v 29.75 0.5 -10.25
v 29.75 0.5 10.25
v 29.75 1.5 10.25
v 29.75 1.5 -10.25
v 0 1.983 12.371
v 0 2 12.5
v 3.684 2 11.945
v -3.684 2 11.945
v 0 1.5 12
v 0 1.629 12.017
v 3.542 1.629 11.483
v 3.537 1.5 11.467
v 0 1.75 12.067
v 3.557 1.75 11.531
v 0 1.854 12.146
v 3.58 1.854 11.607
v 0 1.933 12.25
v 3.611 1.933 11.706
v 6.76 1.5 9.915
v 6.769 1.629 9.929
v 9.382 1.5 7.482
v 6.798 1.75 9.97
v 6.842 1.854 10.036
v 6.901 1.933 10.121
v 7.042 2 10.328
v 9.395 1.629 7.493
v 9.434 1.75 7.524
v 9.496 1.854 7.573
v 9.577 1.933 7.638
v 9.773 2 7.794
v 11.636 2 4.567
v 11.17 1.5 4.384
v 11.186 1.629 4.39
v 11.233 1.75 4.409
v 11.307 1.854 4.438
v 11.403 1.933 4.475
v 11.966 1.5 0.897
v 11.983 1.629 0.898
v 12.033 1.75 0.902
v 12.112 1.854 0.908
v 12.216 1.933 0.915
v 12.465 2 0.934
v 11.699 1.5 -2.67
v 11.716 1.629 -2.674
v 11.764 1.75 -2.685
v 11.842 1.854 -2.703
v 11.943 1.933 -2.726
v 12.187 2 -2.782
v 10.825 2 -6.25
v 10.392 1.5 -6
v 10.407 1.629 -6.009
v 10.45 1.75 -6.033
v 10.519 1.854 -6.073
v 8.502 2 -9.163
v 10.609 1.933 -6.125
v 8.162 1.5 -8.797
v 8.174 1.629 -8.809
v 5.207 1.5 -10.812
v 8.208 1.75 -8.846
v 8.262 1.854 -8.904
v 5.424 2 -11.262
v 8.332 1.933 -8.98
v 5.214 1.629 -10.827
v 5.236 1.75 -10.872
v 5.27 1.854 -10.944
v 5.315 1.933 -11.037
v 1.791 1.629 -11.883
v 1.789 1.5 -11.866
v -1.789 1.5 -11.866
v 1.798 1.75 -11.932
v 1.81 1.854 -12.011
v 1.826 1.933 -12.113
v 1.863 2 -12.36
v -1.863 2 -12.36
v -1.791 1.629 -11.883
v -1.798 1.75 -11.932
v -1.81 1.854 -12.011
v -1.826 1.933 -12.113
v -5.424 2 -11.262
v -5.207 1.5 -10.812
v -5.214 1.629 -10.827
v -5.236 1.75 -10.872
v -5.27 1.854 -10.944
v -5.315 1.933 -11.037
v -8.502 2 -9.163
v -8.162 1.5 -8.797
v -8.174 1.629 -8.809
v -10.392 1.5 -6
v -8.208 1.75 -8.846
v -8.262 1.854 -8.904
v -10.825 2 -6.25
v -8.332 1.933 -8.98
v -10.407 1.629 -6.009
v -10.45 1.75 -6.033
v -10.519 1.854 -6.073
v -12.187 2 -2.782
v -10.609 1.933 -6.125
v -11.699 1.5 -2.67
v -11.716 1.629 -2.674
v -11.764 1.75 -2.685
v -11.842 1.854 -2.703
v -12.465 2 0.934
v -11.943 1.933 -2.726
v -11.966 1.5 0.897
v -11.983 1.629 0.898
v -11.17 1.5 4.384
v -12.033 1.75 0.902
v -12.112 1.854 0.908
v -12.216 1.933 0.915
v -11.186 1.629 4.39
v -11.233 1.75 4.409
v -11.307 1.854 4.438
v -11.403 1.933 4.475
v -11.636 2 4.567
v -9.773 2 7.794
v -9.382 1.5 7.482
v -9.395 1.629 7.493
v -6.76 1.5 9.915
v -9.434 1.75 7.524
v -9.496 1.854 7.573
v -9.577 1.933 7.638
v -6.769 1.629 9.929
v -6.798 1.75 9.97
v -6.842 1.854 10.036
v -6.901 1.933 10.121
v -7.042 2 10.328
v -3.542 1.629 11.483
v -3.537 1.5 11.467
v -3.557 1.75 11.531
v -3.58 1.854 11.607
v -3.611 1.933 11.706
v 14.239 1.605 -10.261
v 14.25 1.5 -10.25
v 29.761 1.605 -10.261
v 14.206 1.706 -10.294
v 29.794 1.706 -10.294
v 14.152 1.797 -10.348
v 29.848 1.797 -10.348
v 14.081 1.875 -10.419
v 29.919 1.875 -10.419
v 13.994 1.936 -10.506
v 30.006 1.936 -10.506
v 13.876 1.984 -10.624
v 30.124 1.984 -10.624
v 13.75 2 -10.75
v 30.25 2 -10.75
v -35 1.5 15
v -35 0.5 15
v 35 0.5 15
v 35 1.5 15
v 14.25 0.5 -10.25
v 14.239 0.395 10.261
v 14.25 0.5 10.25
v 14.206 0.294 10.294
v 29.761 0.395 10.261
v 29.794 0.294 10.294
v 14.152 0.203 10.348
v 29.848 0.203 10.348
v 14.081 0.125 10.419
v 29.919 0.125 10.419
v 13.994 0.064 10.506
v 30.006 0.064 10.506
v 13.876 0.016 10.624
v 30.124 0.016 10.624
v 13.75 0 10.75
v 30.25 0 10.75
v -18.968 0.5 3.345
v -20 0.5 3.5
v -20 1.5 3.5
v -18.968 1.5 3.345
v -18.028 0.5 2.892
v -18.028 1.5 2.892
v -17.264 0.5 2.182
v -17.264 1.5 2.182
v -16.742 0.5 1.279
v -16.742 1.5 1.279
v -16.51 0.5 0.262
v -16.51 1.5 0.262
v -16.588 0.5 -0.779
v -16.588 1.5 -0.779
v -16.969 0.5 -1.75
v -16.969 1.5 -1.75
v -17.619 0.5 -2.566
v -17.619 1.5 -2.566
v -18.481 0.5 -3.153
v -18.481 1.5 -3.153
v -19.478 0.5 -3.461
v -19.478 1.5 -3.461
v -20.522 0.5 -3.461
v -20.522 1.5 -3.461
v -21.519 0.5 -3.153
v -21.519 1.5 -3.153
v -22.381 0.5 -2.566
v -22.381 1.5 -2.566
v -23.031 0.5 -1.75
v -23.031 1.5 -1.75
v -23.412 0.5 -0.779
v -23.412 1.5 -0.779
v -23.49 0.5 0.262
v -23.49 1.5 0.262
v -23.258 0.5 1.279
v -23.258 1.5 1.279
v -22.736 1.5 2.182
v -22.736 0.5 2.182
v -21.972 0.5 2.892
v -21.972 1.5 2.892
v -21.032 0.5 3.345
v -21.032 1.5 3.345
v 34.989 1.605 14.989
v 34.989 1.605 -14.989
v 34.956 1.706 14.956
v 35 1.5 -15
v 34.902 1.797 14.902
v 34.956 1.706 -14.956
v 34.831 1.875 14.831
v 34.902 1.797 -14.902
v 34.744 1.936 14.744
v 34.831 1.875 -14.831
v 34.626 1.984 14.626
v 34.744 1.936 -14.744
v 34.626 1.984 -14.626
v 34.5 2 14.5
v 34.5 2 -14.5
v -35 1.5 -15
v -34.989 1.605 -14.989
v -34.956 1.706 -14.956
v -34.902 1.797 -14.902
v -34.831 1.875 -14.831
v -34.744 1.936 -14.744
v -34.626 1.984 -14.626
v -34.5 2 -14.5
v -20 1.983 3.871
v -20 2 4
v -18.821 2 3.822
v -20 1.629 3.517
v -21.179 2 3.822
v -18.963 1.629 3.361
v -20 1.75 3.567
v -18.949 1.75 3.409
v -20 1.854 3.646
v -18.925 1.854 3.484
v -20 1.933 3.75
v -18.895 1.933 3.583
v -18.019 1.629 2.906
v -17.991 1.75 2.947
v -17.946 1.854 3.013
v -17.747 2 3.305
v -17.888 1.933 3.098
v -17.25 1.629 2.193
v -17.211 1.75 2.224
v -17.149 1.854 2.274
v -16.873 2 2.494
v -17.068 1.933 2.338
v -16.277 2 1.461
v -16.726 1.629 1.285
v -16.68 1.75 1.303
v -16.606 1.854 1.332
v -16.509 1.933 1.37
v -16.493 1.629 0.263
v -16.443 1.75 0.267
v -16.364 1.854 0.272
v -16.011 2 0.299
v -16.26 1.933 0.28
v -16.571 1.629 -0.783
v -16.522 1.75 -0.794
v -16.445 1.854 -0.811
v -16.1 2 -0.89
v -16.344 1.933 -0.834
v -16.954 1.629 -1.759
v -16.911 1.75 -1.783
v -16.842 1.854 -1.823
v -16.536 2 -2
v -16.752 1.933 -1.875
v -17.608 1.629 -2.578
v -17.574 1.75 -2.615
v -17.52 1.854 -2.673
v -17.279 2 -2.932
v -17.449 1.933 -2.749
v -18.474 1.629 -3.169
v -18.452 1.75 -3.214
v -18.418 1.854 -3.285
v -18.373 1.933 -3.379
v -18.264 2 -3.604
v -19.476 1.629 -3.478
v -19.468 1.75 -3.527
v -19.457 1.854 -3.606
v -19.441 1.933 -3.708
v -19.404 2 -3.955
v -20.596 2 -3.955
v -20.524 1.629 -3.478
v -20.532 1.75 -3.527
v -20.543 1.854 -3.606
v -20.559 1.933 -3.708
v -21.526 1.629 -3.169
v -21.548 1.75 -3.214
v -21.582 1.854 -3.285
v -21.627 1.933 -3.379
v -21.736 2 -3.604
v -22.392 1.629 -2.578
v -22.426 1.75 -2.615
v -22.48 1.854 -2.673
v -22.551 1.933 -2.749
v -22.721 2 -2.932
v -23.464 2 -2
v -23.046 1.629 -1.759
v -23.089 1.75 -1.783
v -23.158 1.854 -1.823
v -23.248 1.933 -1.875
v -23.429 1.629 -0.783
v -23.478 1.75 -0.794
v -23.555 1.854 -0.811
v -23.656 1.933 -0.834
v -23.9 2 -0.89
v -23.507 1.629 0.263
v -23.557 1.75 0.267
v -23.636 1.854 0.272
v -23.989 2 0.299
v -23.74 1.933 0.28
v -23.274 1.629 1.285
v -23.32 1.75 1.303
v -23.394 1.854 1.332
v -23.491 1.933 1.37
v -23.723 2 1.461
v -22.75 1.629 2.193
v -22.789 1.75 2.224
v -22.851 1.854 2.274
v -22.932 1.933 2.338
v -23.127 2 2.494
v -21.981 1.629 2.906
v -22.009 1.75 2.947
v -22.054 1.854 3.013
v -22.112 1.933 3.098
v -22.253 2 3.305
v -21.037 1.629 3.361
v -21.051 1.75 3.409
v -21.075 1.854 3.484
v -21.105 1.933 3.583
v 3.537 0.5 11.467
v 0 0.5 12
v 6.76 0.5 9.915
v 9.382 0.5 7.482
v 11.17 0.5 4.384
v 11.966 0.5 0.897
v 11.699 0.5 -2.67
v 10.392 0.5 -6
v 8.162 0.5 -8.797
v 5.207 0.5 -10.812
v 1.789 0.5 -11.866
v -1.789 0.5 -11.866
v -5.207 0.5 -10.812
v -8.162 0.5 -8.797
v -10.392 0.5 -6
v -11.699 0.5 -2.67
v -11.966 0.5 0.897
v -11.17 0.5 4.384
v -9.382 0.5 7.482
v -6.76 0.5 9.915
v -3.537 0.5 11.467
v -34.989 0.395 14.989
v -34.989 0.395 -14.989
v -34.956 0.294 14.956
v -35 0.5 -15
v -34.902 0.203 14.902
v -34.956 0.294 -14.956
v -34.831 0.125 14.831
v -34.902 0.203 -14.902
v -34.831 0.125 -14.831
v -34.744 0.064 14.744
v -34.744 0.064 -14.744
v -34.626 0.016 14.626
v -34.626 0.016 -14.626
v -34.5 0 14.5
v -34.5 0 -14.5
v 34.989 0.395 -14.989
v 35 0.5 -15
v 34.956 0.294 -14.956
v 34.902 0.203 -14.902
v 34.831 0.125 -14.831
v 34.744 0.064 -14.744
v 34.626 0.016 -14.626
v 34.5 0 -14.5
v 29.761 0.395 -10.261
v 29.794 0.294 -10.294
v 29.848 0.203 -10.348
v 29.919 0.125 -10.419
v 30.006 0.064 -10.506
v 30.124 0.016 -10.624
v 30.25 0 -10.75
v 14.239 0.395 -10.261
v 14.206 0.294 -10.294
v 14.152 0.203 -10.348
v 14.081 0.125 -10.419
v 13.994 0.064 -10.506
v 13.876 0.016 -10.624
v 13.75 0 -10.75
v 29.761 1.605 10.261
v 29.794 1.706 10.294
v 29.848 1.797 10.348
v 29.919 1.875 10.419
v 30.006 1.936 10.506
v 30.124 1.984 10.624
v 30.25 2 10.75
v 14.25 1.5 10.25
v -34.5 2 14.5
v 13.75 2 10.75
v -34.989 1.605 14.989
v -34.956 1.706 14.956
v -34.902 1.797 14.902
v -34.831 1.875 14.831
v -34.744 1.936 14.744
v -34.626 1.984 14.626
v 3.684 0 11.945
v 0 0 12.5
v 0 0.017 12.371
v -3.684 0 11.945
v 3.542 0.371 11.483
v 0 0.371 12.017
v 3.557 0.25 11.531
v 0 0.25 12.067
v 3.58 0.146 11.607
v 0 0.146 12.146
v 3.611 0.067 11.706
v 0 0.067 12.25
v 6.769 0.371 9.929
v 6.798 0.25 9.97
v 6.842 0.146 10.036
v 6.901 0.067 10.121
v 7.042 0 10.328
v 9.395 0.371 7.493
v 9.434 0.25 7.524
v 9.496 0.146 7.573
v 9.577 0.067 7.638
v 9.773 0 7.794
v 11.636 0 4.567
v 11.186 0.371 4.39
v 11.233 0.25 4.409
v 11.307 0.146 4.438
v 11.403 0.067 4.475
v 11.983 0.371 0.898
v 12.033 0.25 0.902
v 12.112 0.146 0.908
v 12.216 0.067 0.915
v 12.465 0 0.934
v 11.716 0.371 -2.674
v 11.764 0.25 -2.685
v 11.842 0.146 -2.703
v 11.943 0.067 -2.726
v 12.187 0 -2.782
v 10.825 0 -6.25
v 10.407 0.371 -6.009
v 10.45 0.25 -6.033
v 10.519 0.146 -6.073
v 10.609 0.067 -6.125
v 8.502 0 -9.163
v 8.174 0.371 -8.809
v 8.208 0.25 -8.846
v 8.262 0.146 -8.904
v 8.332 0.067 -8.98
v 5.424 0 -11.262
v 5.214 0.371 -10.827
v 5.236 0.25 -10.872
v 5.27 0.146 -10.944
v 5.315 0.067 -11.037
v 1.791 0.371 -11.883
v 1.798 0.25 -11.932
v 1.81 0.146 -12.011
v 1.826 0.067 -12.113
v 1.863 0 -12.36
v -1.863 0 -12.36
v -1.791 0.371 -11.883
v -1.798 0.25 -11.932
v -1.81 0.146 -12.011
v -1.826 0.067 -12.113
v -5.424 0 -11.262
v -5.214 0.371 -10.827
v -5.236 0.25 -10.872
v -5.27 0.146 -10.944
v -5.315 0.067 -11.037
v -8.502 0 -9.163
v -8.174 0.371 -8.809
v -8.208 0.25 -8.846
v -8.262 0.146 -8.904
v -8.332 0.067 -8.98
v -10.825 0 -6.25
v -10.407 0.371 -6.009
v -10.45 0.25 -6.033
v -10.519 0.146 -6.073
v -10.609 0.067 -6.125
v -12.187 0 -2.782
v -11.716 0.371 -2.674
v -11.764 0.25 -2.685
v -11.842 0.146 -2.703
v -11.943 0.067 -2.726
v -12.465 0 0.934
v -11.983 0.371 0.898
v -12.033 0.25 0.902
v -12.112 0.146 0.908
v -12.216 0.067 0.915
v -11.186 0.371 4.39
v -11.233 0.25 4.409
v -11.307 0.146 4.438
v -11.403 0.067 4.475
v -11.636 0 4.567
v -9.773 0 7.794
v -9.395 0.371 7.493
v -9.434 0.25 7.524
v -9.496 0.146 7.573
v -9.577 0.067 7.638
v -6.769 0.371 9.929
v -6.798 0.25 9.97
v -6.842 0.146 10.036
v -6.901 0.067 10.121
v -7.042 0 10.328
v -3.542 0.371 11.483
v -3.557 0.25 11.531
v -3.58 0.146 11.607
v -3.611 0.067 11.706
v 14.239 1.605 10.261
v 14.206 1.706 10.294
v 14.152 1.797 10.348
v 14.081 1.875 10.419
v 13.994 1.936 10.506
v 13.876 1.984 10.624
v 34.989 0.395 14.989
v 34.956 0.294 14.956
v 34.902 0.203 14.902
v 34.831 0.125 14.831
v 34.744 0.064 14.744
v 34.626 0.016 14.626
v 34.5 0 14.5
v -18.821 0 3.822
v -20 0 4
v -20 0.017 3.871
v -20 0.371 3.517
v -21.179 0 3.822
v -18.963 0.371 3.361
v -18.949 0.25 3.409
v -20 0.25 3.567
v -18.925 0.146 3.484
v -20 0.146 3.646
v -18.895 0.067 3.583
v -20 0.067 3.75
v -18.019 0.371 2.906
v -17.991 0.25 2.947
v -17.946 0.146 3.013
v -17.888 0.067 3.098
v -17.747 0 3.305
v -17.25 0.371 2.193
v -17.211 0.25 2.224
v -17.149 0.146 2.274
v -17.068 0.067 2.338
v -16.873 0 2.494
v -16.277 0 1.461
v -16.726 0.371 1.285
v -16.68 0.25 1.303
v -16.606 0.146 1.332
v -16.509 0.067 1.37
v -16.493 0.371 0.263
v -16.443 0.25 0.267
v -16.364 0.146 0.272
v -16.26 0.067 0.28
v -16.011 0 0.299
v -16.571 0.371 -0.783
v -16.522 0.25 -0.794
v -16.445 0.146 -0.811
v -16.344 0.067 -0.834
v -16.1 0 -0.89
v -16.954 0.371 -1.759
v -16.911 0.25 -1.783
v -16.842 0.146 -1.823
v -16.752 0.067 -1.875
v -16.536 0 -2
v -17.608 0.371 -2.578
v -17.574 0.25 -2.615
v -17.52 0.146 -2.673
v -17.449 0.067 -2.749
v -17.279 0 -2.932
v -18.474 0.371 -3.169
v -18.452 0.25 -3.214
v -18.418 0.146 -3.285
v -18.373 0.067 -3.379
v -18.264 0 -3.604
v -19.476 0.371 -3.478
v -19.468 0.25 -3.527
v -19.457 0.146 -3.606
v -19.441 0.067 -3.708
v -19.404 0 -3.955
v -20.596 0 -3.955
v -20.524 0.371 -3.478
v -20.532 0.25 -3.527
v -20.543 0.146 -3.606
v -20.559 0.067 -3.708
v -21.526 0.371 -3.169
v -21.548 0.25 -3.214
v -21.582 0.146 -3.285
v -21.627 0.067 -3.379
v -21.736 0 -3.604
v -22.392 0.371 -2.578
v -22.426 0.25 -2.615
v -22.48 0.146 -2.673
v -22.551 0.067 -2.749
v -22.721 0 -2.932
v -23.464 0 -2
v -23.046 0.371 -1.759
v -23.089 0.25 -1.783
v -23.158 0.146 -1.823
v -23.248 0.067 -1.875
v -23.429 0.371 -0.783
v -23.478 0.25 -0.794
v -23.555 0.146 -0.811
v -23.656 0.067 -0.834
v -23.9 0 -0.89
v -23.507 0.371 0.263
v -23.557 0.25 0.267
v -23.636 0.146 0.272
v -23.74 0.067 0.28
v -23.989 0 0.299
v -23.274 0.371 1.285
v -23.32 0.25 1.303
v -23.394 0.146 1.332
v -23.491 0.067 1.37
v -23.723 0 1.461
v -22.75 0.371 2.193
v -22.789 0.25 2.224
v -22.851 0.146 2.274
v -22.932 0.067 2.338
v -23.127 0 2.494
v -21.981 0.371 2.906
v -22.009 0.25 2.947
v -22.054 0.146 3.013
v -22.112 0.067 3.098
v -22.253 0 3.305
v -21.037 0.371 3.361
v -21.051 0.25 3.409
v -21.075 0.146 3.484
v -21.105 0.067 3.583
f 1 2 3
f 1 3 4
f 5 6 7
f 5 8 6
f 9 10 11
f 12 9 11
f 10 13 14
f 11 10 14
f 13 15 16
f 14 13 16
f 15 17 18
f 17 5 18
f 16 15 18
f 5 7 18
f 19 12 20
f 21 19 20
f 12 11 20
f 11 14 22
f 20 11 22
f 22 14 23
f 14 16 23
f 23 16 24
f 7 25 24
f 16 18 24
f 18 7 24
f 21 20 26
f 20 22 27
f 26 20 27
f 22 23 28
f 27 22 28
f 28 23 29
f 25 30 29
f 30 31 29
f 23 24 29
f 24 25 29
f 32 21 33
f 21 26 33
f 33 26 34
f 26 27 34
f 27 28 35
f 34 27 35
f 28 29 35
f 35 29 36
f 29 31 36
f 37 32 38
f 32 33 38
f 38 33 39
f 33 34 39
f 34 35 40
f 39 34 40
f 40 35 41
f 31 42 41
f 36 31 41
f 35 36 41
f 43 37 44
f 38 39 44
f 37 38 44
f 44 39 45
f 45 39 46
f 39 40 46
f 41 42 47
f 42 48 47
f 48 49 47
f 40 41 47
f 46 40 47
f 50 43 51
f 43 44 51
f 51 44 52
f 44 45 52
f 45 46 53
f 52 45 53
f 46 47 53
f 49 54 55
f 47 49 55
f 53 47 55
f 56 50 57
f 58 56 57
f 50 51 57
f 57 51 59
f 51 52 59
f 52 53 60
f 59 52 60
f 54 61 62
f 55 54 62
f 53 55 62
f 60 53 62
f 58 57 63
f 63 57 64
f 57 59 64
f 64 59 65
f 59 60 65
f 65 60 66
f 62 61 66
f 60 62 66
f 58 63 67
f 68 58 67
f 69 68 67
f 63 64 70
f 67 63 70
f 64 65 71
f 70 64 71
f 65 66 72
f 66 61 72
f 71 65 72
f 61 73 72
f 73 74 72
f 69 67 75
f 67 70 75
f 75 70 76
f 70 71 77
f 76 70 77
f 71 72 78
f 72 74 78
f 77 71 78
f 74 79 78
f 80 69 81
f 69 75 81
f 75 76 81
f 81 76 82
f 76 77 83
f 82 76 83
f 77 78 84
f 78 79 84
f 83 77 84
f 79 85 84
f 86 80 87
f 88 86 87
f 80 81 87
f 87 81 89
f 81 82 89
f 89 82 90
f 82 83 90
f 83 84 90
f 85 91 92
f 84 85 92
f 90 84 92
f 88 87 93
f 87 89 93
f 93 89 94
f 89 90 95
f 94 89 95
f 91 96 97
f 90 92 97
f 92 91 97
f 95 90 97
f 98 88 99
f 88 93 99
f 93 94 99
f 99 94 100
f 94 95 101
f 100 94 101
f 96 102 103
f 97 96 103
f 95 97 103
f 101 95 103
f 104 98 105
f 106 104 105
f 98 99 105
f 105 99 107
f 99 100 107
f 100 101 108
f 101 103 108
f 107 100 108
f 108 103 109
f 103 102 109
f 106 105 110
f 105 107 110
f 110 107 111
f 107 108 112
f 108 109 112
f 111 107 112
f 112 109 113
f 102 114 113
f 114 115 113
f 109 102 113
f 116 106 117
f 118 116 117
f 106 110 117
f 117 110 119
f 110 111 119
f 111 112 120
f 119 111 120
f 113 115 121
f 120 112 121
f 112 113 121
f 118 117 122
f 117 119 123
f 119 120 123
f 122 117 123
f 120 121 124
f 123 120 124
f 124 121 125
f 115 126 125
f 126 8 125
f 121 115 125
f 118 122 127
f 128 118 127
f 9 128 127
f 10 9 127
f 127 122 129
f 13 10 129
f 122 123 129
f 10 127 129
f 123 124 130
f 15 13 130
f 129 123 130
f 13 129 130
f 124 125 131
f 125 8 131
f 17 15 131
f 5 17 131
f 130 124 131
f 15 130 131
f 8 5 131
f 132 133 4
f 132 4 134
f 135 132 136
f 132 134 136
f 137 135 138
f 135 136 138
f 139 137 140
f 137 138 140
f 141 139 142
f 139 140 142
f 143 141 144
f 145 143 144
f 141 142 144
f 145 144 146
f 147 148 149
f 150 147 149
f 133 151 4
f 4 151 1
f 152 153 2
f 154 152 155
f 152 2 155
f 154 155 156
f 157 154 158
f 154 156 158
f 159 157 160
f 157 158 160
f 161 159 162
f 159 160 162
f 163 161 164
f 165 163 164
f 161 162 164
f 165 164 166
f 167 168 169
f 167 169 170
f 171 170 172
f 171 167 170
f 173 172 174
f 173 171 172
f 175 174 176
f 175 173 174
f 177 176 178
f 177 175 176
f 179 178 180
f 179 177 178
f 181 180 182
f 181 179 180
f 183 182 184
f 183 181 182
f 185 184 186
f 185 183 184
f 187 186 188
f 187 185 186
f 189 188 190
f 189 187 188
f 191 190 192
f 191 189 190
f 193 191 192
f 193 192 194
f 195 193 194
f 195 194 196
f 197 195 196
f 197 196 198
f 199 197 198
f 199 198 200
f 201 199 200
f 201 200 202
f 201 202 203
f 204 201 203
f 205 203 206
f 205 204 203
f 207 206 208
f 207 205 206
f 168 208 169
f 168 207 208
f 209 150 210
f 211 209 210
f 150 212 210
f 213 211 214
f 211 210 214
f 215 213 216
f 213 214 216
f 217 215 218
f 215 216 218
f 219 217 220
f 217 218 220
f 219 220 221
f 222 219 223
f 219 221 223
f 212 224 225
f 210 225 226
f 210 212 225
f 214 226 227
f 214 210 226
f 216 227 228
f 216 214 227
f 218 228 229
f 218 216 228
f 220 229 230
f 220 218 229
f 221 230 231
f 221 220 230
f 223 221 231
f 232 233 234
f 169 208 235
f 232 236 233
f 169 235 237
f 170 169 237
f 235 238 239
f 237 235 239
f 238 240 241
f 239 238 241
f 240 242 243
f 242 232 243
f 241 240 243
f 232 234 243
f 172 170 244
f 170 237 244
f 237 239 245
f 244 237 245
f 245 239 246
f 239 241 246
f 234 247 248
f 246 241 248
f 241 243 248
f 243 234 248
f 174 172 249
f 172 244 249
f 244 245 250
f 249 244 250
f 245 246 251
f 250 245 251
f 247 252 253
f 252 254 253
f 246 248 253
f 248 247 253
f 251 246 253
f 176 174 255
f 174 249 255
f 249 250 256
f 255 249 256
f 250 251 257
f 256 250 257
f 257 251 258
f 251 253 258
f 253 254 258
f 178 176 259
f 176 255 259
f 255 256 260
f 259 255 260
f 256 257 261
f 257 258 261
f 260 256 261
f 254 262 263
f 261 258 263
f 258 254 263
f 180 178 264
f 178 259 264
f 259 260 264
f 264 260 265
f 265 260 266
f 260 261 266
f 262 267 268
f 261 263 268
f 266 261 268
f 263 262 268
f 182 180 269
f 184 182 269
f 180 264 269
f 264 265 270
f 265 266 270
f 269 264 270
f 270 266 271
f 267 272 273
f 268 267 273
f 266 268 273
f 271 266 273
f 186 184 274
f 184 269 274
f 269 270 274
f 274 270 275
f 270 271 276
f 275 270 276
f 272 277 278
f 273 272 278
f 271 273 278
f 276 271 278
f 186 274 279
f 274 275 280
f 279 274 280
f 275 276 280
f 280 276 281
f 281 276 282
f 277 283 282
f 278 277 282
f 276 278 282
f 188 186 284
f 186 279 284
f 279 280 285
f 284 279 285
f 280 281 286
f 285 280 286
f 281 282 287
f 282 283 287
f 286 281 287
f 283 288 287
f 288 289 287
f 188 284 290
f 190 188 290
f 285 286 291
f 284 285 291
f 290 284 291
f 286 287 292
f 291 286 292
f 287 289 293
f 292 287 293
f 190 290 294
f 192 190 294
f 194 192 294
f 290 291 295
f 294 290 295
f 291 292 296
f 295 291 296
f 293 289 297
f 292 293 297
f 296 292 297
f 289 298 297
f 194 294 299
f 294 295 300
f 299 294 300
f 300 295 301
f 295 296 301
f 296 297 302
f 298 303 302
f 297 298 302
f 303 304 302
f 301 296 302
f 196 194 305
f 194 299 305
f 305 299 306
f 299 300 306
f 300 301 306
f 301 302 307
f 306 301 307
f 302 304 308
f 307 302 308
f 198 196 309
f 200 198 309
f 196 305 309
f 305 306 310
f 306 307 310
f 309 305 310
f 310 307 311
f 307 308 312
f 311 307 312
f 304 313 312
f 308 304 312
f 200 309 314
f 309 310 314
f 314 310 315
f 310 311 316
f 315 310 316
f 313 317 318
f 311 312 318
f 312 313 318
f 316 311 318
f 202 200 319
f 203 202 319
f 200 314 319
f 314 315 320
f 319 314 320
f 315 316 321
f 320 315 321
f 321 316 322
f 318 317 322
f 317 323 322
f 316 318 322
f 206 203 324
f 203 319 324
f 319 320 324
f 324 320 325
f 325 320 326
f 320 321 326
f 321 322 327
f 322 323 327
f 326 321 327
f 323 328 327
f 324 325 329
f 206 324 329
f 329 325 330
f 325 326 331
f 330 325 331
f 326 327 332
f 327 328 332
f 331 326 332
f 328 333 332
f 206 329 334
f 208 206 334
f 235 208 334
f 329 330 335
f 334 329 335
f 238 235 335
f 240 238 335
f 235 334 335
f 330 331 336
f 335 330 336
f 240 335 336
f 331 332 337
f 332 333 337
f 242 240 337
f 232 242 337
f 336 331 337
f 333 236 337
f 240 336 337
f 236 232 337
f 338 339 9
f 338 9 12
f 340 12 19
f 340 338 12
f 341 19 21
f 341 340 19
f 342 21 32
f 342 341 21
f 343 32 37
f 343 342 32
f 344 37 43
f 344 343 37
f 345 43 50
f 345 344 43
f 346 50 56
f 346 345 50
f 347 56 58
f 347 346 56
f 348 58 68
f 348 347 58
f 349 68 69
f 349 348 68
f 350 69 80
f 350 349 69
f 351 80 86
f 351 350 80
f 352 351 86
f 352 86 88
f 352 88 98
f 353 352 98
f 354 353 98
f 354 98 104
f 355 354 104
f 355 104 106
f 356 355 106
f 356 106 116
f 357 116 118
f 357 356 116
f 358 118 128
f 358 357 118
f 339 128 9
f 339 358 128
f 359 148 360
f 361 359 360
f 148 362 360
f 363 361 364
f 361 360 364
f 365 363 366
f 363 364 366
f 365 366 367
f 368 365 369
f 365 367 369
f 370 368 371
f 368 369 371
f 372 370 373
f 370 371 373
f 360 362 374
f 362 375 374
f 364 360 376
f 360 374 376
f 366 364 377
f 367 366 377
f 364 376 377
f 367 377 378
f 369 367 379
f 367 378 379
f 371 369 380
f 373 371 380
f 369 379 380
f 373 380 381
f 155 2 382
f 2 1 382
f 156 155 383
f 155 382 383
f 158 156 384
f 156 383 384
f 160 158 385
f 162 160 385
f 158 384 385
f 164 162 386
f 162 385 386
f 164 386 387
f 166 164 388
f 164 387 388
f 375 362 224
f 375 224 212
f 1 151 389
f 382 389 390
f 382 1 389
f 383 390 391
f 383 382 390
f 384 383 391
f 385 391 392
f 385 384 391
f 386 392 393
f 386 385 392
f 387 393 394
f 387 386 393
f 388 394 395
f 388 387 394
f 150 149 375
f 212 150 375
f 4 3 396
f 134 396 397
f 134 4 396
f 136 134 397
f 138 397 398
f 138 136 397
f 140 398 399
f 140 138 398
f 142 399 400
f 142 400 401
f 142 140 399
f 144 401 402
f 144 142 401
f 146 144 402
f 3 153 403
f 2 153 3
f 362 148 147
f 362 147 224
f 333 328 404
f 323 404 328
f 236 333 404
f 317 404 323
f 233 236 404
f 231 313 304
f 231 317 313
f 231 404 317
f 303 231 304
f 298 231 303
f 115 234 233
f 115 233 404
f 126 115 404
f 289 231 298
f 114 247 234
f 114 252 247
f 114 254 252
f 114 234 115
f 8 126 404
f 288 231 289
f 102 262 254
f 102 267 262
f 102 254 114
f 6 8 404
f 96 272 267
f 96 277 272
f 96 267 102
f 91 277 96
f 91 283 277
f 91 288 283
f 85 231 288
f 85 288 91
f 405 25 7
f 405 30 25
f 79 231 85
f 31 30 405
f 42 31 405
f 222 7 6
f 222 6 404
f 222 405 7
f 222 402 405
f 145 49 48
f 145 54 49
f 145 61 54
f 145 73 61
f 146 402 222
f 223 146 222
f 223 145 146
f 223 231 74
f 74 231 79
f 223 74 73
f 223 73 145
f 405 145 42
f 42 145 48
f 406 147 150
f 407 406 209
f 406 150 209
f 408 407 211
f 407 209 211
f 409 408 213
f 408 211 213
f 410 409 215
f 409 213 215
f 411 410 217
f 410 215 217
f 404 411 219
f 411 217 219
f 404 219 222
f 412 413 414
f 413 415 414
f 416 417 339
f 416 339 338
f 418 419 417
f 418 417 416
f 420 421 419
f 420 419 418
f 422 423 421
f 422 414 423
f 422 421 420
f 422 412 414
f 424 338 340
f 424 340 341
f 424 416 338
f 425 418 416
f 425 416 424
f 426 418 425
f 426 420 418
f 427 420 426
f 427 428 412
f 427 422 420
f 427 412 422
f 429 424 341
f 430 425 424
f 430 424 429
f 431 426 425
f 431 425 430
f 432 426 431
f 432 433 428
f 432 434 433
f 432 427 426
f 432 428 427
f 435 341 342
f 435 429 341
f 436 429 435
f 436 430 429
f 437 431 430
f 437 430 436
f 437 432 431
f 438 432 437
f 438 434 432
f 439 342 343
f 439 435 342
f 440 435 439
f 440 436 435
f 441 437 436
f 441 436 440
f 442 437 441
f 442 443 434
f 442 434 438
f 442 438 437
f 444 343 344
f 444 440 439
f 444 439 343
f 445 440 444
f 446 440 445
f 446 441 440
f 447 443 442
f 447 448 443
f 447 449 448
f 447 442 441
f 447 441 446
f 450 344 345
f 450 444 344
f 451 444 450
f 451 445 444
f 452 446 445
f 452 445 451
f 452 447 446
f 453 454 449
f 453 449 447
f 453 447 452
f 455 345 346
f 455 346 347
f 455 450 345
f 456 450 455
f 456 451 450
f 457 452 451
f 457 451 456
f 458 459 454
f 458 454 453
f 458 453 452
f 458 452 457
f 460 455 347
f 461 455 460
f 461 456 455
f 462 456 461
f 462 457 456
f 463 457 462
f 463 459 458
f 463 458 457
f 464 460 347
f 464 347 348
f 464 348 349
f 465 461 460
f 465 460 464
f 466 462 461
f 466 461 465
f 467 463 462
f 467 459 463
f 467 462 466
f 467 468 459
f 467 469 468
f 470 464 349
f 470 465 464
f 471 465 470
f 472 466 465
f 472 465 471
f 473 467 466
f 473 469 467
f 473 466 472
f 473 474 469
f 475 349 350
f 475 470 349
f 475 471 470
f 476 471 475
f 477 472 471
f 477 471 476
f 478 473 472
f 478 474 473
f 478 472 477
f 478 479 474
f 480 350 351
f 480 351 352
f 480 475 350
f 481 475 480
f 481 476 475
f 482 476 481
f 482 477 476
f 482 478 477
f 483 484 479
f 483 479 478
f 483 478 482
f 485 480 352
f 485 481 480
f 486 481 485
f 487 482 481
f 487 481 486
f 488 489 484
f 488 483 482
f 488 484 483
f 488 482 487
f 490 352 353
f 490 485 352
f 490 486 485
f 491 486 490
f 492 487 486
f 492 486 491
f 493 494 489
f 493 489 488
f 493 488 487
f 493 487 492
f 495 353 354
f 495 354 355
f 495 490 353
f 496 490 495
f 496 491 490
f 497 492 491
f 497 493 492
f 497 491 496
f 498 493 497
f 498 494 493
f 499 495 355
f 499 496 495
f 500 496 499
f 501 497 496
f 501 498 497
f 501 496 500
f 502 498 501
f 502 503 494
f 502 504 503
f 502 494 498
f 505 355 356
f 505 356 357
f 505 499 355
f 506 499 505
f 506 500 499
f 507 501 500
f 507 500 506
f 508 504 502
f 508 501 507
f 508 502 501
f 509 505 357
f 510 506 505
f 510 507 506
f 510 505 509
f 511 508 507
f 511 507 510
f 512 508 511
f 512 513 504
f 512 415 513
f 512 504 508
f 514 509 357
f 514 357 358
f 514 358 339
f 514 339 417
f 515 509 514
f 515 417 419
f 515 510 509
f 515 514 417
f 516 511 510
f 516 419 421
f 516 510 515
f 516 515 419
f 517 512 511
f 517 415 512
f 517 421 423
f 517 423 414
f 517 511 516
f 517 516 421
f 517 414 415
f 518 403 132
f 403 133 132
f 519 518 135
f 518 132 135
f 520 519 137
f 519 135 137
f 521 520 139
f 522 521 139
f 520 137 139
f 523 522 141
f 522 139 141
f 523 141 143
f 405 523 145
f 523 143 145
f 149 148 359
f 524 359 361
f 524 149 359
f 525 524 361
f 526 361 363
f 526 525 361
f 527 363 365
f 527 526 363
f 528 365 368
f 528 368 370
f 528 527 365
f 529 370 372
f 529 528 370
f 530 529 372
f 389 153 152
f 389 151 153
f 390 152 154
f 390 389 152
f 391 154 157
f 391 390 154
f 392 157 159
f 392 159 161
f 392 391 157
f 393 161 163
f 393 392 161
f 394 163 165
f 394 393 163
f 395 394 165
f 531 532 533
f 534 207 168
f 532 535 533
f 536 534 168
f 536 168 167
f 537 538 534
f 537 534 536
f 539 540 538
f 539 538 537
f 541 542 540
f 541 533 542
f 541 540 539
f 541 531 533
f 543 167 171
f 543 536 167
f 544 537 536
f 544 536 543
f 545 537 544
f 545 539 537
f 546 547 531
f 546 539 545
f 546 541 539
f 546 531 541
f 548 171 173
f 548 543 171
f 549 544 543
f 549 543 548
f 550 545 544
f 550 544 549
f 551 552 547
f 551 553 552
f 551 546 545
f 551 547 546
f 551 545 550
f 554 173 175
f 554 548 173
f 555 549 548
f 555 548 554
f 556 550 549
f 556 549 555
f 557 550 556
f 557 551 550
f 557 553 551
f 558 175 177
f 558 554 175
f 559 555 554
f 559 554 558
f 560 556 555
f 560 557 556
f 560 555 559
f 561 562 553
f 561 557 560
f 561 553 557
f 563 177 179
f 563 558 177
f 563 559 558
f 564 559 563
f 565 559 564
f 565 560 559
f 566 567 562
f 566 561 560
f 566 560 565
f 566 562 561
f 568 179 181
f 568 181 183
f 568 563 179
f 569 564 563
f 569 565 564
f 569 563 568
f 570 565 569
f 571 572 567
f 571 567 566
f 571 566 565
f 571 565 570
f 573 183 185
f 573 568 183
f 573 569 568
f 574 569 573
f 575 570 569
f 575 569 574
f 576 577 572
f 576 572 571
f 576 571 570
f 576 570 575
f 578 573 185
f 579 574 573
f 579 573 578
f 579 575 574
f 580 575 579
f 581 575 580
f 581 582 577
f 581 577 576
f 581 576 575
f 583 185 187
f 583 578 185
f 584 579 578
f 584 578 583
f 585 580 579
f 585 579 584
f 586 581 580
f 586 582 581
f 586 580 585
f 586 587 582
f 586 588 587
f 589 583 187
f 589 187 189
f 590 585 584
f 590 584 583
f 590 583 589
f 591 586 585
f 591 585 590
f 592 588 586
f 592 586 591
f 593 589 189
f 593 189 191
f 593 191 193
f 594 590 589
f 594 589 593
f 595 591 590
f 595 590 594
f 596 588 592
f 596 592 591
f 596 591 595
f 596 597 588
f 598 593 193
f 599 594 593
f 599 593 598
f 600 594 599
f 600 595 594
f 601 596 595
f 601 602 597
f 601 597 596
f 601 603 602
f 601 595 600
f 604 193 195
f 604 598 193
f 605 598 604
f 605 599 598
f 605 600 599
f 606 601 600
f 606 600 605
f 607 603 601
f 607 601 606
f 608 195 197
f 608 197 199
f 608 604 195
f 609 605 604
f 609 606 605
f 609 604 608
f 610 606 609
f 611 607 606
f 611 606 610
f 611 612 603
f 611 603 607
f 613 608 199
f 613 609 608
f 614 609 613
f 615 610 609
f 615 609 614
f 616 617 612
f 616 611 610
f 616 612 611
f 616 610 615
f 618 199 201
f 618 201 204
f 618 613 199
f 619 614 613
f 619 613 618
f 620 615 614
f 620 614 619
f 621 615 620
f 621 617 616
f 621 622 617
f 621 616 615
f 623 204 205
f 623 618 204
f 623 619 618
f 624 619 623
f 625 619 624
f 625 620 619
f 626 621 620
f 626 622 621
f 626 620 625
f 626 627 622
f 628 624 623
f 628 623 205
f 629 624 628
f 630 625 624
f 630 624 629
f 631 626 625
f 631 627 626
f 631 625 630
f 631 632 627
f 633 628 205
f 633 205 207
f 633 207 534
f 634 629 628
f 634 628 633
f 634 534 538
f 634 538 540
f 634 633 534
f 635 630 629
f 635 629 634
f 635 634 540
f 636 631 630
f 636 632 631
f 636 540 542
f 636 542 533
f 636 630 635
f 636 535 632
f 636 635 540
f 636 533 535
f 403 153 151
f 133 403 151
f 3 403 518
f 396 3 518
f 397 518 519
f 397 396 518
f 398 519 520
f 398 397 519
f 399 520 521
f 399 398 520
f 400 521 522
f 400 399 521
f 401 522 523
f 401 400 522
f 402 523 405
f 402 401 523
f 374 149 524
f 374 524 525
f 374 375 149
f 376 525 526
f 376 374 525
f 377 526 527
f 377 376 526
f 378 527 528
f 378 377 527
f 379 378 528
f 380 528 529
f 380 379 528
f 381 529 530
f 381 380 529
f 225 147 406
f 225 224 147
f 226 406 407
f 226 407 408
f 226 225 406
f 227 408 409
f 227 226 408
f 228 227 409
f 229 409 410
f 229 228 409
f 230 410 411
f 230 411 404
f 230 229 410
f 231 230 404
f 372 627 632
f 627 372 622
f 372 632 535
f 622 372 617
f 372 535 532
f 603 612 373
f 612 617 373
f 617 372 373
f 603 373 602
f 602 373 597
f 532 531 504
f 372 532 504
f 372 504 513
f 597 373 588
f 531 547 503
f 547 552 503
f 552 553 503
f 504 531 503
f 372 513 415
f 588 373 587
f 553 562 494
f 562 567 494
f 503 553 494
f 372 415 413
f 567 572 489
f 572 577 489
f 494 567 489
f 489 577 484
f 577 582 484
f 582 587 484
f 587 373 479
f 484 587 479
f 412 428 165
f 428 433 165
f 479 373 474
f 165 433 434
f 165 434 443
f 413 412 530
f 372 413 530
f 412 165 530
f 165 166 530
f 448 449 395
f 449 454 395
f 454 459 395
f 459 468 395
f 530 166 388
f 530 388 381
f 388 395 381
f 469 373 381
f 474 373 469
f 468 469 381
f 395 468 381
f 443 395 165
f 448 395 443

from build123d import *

# Parameters (mm, degrees)
SKETCH1_W           = 70
SKETCH1_H           = 30
SKETCH1_R           = 12
SKETCH1_R_2         = 3.5
SKETCH1_W_2         = 15.5
SKETCH1_H_2         = 20.5
BOSS_EXTRUDE1_DEPTH = 2
FILLET1_R           = 0.5


with BuildPart() as part:
    # Sketch1 → Boss-Extrude1 (new body)
    with BuildSketch(Plane(origin=(0, 0, 0), x_dir=(1, 0, 0), z_dir=(0, 1, 0))):
        Rectangle(SKETCH1_W, SKETCH1_H)
        with Locations(Location((0, 0, 0), (0, 0, 270))):
            Circle(SKETCH1_R, mode=Mode.SUBTRACT)
        with Locations(Location((-20, 0, 0), (0, 0, 270))):
            Circle(SKETCH1_R_2, mode=Mode.SUBTRACT)
        with Locations((22, 0)):
            Rectangle(SKETCH1_W_2, SKETCH1_H_2, mode=Mode.SUBTRACT)
    extrude(amount=BOSS_EXTRUDE1_DEPTH)

    # Fillet1
    fillet1_edges = [part.edges().sort_by_distance(p)[0] for p in [
        (0, 0, -12),
        (0, 2, -12),
        (35, 2, 0),
        (-20, 0, -3.5),
        (-20, 2, -3.5),
        (0, 2, -15),
        (14.25, 0, 0),
        (22, 0, 10.25),
        (29.75, 0, 0),
        (22, 0, -10.25),
        (14.25, 2, 0),
        (22, 2, 10.25),
        (29.75, 2, 0),
        (22, 2, -10.25),
        (-35, 2, 0),
        (0, 0, -15),
        (35, 0, 0),
        (0, 0, 15),
        (-35, 0, 0),
        (0, 2, 15),
    ]]
    fillet(fillet1_edges, radius=FILLET1_R)


solid = part.part
